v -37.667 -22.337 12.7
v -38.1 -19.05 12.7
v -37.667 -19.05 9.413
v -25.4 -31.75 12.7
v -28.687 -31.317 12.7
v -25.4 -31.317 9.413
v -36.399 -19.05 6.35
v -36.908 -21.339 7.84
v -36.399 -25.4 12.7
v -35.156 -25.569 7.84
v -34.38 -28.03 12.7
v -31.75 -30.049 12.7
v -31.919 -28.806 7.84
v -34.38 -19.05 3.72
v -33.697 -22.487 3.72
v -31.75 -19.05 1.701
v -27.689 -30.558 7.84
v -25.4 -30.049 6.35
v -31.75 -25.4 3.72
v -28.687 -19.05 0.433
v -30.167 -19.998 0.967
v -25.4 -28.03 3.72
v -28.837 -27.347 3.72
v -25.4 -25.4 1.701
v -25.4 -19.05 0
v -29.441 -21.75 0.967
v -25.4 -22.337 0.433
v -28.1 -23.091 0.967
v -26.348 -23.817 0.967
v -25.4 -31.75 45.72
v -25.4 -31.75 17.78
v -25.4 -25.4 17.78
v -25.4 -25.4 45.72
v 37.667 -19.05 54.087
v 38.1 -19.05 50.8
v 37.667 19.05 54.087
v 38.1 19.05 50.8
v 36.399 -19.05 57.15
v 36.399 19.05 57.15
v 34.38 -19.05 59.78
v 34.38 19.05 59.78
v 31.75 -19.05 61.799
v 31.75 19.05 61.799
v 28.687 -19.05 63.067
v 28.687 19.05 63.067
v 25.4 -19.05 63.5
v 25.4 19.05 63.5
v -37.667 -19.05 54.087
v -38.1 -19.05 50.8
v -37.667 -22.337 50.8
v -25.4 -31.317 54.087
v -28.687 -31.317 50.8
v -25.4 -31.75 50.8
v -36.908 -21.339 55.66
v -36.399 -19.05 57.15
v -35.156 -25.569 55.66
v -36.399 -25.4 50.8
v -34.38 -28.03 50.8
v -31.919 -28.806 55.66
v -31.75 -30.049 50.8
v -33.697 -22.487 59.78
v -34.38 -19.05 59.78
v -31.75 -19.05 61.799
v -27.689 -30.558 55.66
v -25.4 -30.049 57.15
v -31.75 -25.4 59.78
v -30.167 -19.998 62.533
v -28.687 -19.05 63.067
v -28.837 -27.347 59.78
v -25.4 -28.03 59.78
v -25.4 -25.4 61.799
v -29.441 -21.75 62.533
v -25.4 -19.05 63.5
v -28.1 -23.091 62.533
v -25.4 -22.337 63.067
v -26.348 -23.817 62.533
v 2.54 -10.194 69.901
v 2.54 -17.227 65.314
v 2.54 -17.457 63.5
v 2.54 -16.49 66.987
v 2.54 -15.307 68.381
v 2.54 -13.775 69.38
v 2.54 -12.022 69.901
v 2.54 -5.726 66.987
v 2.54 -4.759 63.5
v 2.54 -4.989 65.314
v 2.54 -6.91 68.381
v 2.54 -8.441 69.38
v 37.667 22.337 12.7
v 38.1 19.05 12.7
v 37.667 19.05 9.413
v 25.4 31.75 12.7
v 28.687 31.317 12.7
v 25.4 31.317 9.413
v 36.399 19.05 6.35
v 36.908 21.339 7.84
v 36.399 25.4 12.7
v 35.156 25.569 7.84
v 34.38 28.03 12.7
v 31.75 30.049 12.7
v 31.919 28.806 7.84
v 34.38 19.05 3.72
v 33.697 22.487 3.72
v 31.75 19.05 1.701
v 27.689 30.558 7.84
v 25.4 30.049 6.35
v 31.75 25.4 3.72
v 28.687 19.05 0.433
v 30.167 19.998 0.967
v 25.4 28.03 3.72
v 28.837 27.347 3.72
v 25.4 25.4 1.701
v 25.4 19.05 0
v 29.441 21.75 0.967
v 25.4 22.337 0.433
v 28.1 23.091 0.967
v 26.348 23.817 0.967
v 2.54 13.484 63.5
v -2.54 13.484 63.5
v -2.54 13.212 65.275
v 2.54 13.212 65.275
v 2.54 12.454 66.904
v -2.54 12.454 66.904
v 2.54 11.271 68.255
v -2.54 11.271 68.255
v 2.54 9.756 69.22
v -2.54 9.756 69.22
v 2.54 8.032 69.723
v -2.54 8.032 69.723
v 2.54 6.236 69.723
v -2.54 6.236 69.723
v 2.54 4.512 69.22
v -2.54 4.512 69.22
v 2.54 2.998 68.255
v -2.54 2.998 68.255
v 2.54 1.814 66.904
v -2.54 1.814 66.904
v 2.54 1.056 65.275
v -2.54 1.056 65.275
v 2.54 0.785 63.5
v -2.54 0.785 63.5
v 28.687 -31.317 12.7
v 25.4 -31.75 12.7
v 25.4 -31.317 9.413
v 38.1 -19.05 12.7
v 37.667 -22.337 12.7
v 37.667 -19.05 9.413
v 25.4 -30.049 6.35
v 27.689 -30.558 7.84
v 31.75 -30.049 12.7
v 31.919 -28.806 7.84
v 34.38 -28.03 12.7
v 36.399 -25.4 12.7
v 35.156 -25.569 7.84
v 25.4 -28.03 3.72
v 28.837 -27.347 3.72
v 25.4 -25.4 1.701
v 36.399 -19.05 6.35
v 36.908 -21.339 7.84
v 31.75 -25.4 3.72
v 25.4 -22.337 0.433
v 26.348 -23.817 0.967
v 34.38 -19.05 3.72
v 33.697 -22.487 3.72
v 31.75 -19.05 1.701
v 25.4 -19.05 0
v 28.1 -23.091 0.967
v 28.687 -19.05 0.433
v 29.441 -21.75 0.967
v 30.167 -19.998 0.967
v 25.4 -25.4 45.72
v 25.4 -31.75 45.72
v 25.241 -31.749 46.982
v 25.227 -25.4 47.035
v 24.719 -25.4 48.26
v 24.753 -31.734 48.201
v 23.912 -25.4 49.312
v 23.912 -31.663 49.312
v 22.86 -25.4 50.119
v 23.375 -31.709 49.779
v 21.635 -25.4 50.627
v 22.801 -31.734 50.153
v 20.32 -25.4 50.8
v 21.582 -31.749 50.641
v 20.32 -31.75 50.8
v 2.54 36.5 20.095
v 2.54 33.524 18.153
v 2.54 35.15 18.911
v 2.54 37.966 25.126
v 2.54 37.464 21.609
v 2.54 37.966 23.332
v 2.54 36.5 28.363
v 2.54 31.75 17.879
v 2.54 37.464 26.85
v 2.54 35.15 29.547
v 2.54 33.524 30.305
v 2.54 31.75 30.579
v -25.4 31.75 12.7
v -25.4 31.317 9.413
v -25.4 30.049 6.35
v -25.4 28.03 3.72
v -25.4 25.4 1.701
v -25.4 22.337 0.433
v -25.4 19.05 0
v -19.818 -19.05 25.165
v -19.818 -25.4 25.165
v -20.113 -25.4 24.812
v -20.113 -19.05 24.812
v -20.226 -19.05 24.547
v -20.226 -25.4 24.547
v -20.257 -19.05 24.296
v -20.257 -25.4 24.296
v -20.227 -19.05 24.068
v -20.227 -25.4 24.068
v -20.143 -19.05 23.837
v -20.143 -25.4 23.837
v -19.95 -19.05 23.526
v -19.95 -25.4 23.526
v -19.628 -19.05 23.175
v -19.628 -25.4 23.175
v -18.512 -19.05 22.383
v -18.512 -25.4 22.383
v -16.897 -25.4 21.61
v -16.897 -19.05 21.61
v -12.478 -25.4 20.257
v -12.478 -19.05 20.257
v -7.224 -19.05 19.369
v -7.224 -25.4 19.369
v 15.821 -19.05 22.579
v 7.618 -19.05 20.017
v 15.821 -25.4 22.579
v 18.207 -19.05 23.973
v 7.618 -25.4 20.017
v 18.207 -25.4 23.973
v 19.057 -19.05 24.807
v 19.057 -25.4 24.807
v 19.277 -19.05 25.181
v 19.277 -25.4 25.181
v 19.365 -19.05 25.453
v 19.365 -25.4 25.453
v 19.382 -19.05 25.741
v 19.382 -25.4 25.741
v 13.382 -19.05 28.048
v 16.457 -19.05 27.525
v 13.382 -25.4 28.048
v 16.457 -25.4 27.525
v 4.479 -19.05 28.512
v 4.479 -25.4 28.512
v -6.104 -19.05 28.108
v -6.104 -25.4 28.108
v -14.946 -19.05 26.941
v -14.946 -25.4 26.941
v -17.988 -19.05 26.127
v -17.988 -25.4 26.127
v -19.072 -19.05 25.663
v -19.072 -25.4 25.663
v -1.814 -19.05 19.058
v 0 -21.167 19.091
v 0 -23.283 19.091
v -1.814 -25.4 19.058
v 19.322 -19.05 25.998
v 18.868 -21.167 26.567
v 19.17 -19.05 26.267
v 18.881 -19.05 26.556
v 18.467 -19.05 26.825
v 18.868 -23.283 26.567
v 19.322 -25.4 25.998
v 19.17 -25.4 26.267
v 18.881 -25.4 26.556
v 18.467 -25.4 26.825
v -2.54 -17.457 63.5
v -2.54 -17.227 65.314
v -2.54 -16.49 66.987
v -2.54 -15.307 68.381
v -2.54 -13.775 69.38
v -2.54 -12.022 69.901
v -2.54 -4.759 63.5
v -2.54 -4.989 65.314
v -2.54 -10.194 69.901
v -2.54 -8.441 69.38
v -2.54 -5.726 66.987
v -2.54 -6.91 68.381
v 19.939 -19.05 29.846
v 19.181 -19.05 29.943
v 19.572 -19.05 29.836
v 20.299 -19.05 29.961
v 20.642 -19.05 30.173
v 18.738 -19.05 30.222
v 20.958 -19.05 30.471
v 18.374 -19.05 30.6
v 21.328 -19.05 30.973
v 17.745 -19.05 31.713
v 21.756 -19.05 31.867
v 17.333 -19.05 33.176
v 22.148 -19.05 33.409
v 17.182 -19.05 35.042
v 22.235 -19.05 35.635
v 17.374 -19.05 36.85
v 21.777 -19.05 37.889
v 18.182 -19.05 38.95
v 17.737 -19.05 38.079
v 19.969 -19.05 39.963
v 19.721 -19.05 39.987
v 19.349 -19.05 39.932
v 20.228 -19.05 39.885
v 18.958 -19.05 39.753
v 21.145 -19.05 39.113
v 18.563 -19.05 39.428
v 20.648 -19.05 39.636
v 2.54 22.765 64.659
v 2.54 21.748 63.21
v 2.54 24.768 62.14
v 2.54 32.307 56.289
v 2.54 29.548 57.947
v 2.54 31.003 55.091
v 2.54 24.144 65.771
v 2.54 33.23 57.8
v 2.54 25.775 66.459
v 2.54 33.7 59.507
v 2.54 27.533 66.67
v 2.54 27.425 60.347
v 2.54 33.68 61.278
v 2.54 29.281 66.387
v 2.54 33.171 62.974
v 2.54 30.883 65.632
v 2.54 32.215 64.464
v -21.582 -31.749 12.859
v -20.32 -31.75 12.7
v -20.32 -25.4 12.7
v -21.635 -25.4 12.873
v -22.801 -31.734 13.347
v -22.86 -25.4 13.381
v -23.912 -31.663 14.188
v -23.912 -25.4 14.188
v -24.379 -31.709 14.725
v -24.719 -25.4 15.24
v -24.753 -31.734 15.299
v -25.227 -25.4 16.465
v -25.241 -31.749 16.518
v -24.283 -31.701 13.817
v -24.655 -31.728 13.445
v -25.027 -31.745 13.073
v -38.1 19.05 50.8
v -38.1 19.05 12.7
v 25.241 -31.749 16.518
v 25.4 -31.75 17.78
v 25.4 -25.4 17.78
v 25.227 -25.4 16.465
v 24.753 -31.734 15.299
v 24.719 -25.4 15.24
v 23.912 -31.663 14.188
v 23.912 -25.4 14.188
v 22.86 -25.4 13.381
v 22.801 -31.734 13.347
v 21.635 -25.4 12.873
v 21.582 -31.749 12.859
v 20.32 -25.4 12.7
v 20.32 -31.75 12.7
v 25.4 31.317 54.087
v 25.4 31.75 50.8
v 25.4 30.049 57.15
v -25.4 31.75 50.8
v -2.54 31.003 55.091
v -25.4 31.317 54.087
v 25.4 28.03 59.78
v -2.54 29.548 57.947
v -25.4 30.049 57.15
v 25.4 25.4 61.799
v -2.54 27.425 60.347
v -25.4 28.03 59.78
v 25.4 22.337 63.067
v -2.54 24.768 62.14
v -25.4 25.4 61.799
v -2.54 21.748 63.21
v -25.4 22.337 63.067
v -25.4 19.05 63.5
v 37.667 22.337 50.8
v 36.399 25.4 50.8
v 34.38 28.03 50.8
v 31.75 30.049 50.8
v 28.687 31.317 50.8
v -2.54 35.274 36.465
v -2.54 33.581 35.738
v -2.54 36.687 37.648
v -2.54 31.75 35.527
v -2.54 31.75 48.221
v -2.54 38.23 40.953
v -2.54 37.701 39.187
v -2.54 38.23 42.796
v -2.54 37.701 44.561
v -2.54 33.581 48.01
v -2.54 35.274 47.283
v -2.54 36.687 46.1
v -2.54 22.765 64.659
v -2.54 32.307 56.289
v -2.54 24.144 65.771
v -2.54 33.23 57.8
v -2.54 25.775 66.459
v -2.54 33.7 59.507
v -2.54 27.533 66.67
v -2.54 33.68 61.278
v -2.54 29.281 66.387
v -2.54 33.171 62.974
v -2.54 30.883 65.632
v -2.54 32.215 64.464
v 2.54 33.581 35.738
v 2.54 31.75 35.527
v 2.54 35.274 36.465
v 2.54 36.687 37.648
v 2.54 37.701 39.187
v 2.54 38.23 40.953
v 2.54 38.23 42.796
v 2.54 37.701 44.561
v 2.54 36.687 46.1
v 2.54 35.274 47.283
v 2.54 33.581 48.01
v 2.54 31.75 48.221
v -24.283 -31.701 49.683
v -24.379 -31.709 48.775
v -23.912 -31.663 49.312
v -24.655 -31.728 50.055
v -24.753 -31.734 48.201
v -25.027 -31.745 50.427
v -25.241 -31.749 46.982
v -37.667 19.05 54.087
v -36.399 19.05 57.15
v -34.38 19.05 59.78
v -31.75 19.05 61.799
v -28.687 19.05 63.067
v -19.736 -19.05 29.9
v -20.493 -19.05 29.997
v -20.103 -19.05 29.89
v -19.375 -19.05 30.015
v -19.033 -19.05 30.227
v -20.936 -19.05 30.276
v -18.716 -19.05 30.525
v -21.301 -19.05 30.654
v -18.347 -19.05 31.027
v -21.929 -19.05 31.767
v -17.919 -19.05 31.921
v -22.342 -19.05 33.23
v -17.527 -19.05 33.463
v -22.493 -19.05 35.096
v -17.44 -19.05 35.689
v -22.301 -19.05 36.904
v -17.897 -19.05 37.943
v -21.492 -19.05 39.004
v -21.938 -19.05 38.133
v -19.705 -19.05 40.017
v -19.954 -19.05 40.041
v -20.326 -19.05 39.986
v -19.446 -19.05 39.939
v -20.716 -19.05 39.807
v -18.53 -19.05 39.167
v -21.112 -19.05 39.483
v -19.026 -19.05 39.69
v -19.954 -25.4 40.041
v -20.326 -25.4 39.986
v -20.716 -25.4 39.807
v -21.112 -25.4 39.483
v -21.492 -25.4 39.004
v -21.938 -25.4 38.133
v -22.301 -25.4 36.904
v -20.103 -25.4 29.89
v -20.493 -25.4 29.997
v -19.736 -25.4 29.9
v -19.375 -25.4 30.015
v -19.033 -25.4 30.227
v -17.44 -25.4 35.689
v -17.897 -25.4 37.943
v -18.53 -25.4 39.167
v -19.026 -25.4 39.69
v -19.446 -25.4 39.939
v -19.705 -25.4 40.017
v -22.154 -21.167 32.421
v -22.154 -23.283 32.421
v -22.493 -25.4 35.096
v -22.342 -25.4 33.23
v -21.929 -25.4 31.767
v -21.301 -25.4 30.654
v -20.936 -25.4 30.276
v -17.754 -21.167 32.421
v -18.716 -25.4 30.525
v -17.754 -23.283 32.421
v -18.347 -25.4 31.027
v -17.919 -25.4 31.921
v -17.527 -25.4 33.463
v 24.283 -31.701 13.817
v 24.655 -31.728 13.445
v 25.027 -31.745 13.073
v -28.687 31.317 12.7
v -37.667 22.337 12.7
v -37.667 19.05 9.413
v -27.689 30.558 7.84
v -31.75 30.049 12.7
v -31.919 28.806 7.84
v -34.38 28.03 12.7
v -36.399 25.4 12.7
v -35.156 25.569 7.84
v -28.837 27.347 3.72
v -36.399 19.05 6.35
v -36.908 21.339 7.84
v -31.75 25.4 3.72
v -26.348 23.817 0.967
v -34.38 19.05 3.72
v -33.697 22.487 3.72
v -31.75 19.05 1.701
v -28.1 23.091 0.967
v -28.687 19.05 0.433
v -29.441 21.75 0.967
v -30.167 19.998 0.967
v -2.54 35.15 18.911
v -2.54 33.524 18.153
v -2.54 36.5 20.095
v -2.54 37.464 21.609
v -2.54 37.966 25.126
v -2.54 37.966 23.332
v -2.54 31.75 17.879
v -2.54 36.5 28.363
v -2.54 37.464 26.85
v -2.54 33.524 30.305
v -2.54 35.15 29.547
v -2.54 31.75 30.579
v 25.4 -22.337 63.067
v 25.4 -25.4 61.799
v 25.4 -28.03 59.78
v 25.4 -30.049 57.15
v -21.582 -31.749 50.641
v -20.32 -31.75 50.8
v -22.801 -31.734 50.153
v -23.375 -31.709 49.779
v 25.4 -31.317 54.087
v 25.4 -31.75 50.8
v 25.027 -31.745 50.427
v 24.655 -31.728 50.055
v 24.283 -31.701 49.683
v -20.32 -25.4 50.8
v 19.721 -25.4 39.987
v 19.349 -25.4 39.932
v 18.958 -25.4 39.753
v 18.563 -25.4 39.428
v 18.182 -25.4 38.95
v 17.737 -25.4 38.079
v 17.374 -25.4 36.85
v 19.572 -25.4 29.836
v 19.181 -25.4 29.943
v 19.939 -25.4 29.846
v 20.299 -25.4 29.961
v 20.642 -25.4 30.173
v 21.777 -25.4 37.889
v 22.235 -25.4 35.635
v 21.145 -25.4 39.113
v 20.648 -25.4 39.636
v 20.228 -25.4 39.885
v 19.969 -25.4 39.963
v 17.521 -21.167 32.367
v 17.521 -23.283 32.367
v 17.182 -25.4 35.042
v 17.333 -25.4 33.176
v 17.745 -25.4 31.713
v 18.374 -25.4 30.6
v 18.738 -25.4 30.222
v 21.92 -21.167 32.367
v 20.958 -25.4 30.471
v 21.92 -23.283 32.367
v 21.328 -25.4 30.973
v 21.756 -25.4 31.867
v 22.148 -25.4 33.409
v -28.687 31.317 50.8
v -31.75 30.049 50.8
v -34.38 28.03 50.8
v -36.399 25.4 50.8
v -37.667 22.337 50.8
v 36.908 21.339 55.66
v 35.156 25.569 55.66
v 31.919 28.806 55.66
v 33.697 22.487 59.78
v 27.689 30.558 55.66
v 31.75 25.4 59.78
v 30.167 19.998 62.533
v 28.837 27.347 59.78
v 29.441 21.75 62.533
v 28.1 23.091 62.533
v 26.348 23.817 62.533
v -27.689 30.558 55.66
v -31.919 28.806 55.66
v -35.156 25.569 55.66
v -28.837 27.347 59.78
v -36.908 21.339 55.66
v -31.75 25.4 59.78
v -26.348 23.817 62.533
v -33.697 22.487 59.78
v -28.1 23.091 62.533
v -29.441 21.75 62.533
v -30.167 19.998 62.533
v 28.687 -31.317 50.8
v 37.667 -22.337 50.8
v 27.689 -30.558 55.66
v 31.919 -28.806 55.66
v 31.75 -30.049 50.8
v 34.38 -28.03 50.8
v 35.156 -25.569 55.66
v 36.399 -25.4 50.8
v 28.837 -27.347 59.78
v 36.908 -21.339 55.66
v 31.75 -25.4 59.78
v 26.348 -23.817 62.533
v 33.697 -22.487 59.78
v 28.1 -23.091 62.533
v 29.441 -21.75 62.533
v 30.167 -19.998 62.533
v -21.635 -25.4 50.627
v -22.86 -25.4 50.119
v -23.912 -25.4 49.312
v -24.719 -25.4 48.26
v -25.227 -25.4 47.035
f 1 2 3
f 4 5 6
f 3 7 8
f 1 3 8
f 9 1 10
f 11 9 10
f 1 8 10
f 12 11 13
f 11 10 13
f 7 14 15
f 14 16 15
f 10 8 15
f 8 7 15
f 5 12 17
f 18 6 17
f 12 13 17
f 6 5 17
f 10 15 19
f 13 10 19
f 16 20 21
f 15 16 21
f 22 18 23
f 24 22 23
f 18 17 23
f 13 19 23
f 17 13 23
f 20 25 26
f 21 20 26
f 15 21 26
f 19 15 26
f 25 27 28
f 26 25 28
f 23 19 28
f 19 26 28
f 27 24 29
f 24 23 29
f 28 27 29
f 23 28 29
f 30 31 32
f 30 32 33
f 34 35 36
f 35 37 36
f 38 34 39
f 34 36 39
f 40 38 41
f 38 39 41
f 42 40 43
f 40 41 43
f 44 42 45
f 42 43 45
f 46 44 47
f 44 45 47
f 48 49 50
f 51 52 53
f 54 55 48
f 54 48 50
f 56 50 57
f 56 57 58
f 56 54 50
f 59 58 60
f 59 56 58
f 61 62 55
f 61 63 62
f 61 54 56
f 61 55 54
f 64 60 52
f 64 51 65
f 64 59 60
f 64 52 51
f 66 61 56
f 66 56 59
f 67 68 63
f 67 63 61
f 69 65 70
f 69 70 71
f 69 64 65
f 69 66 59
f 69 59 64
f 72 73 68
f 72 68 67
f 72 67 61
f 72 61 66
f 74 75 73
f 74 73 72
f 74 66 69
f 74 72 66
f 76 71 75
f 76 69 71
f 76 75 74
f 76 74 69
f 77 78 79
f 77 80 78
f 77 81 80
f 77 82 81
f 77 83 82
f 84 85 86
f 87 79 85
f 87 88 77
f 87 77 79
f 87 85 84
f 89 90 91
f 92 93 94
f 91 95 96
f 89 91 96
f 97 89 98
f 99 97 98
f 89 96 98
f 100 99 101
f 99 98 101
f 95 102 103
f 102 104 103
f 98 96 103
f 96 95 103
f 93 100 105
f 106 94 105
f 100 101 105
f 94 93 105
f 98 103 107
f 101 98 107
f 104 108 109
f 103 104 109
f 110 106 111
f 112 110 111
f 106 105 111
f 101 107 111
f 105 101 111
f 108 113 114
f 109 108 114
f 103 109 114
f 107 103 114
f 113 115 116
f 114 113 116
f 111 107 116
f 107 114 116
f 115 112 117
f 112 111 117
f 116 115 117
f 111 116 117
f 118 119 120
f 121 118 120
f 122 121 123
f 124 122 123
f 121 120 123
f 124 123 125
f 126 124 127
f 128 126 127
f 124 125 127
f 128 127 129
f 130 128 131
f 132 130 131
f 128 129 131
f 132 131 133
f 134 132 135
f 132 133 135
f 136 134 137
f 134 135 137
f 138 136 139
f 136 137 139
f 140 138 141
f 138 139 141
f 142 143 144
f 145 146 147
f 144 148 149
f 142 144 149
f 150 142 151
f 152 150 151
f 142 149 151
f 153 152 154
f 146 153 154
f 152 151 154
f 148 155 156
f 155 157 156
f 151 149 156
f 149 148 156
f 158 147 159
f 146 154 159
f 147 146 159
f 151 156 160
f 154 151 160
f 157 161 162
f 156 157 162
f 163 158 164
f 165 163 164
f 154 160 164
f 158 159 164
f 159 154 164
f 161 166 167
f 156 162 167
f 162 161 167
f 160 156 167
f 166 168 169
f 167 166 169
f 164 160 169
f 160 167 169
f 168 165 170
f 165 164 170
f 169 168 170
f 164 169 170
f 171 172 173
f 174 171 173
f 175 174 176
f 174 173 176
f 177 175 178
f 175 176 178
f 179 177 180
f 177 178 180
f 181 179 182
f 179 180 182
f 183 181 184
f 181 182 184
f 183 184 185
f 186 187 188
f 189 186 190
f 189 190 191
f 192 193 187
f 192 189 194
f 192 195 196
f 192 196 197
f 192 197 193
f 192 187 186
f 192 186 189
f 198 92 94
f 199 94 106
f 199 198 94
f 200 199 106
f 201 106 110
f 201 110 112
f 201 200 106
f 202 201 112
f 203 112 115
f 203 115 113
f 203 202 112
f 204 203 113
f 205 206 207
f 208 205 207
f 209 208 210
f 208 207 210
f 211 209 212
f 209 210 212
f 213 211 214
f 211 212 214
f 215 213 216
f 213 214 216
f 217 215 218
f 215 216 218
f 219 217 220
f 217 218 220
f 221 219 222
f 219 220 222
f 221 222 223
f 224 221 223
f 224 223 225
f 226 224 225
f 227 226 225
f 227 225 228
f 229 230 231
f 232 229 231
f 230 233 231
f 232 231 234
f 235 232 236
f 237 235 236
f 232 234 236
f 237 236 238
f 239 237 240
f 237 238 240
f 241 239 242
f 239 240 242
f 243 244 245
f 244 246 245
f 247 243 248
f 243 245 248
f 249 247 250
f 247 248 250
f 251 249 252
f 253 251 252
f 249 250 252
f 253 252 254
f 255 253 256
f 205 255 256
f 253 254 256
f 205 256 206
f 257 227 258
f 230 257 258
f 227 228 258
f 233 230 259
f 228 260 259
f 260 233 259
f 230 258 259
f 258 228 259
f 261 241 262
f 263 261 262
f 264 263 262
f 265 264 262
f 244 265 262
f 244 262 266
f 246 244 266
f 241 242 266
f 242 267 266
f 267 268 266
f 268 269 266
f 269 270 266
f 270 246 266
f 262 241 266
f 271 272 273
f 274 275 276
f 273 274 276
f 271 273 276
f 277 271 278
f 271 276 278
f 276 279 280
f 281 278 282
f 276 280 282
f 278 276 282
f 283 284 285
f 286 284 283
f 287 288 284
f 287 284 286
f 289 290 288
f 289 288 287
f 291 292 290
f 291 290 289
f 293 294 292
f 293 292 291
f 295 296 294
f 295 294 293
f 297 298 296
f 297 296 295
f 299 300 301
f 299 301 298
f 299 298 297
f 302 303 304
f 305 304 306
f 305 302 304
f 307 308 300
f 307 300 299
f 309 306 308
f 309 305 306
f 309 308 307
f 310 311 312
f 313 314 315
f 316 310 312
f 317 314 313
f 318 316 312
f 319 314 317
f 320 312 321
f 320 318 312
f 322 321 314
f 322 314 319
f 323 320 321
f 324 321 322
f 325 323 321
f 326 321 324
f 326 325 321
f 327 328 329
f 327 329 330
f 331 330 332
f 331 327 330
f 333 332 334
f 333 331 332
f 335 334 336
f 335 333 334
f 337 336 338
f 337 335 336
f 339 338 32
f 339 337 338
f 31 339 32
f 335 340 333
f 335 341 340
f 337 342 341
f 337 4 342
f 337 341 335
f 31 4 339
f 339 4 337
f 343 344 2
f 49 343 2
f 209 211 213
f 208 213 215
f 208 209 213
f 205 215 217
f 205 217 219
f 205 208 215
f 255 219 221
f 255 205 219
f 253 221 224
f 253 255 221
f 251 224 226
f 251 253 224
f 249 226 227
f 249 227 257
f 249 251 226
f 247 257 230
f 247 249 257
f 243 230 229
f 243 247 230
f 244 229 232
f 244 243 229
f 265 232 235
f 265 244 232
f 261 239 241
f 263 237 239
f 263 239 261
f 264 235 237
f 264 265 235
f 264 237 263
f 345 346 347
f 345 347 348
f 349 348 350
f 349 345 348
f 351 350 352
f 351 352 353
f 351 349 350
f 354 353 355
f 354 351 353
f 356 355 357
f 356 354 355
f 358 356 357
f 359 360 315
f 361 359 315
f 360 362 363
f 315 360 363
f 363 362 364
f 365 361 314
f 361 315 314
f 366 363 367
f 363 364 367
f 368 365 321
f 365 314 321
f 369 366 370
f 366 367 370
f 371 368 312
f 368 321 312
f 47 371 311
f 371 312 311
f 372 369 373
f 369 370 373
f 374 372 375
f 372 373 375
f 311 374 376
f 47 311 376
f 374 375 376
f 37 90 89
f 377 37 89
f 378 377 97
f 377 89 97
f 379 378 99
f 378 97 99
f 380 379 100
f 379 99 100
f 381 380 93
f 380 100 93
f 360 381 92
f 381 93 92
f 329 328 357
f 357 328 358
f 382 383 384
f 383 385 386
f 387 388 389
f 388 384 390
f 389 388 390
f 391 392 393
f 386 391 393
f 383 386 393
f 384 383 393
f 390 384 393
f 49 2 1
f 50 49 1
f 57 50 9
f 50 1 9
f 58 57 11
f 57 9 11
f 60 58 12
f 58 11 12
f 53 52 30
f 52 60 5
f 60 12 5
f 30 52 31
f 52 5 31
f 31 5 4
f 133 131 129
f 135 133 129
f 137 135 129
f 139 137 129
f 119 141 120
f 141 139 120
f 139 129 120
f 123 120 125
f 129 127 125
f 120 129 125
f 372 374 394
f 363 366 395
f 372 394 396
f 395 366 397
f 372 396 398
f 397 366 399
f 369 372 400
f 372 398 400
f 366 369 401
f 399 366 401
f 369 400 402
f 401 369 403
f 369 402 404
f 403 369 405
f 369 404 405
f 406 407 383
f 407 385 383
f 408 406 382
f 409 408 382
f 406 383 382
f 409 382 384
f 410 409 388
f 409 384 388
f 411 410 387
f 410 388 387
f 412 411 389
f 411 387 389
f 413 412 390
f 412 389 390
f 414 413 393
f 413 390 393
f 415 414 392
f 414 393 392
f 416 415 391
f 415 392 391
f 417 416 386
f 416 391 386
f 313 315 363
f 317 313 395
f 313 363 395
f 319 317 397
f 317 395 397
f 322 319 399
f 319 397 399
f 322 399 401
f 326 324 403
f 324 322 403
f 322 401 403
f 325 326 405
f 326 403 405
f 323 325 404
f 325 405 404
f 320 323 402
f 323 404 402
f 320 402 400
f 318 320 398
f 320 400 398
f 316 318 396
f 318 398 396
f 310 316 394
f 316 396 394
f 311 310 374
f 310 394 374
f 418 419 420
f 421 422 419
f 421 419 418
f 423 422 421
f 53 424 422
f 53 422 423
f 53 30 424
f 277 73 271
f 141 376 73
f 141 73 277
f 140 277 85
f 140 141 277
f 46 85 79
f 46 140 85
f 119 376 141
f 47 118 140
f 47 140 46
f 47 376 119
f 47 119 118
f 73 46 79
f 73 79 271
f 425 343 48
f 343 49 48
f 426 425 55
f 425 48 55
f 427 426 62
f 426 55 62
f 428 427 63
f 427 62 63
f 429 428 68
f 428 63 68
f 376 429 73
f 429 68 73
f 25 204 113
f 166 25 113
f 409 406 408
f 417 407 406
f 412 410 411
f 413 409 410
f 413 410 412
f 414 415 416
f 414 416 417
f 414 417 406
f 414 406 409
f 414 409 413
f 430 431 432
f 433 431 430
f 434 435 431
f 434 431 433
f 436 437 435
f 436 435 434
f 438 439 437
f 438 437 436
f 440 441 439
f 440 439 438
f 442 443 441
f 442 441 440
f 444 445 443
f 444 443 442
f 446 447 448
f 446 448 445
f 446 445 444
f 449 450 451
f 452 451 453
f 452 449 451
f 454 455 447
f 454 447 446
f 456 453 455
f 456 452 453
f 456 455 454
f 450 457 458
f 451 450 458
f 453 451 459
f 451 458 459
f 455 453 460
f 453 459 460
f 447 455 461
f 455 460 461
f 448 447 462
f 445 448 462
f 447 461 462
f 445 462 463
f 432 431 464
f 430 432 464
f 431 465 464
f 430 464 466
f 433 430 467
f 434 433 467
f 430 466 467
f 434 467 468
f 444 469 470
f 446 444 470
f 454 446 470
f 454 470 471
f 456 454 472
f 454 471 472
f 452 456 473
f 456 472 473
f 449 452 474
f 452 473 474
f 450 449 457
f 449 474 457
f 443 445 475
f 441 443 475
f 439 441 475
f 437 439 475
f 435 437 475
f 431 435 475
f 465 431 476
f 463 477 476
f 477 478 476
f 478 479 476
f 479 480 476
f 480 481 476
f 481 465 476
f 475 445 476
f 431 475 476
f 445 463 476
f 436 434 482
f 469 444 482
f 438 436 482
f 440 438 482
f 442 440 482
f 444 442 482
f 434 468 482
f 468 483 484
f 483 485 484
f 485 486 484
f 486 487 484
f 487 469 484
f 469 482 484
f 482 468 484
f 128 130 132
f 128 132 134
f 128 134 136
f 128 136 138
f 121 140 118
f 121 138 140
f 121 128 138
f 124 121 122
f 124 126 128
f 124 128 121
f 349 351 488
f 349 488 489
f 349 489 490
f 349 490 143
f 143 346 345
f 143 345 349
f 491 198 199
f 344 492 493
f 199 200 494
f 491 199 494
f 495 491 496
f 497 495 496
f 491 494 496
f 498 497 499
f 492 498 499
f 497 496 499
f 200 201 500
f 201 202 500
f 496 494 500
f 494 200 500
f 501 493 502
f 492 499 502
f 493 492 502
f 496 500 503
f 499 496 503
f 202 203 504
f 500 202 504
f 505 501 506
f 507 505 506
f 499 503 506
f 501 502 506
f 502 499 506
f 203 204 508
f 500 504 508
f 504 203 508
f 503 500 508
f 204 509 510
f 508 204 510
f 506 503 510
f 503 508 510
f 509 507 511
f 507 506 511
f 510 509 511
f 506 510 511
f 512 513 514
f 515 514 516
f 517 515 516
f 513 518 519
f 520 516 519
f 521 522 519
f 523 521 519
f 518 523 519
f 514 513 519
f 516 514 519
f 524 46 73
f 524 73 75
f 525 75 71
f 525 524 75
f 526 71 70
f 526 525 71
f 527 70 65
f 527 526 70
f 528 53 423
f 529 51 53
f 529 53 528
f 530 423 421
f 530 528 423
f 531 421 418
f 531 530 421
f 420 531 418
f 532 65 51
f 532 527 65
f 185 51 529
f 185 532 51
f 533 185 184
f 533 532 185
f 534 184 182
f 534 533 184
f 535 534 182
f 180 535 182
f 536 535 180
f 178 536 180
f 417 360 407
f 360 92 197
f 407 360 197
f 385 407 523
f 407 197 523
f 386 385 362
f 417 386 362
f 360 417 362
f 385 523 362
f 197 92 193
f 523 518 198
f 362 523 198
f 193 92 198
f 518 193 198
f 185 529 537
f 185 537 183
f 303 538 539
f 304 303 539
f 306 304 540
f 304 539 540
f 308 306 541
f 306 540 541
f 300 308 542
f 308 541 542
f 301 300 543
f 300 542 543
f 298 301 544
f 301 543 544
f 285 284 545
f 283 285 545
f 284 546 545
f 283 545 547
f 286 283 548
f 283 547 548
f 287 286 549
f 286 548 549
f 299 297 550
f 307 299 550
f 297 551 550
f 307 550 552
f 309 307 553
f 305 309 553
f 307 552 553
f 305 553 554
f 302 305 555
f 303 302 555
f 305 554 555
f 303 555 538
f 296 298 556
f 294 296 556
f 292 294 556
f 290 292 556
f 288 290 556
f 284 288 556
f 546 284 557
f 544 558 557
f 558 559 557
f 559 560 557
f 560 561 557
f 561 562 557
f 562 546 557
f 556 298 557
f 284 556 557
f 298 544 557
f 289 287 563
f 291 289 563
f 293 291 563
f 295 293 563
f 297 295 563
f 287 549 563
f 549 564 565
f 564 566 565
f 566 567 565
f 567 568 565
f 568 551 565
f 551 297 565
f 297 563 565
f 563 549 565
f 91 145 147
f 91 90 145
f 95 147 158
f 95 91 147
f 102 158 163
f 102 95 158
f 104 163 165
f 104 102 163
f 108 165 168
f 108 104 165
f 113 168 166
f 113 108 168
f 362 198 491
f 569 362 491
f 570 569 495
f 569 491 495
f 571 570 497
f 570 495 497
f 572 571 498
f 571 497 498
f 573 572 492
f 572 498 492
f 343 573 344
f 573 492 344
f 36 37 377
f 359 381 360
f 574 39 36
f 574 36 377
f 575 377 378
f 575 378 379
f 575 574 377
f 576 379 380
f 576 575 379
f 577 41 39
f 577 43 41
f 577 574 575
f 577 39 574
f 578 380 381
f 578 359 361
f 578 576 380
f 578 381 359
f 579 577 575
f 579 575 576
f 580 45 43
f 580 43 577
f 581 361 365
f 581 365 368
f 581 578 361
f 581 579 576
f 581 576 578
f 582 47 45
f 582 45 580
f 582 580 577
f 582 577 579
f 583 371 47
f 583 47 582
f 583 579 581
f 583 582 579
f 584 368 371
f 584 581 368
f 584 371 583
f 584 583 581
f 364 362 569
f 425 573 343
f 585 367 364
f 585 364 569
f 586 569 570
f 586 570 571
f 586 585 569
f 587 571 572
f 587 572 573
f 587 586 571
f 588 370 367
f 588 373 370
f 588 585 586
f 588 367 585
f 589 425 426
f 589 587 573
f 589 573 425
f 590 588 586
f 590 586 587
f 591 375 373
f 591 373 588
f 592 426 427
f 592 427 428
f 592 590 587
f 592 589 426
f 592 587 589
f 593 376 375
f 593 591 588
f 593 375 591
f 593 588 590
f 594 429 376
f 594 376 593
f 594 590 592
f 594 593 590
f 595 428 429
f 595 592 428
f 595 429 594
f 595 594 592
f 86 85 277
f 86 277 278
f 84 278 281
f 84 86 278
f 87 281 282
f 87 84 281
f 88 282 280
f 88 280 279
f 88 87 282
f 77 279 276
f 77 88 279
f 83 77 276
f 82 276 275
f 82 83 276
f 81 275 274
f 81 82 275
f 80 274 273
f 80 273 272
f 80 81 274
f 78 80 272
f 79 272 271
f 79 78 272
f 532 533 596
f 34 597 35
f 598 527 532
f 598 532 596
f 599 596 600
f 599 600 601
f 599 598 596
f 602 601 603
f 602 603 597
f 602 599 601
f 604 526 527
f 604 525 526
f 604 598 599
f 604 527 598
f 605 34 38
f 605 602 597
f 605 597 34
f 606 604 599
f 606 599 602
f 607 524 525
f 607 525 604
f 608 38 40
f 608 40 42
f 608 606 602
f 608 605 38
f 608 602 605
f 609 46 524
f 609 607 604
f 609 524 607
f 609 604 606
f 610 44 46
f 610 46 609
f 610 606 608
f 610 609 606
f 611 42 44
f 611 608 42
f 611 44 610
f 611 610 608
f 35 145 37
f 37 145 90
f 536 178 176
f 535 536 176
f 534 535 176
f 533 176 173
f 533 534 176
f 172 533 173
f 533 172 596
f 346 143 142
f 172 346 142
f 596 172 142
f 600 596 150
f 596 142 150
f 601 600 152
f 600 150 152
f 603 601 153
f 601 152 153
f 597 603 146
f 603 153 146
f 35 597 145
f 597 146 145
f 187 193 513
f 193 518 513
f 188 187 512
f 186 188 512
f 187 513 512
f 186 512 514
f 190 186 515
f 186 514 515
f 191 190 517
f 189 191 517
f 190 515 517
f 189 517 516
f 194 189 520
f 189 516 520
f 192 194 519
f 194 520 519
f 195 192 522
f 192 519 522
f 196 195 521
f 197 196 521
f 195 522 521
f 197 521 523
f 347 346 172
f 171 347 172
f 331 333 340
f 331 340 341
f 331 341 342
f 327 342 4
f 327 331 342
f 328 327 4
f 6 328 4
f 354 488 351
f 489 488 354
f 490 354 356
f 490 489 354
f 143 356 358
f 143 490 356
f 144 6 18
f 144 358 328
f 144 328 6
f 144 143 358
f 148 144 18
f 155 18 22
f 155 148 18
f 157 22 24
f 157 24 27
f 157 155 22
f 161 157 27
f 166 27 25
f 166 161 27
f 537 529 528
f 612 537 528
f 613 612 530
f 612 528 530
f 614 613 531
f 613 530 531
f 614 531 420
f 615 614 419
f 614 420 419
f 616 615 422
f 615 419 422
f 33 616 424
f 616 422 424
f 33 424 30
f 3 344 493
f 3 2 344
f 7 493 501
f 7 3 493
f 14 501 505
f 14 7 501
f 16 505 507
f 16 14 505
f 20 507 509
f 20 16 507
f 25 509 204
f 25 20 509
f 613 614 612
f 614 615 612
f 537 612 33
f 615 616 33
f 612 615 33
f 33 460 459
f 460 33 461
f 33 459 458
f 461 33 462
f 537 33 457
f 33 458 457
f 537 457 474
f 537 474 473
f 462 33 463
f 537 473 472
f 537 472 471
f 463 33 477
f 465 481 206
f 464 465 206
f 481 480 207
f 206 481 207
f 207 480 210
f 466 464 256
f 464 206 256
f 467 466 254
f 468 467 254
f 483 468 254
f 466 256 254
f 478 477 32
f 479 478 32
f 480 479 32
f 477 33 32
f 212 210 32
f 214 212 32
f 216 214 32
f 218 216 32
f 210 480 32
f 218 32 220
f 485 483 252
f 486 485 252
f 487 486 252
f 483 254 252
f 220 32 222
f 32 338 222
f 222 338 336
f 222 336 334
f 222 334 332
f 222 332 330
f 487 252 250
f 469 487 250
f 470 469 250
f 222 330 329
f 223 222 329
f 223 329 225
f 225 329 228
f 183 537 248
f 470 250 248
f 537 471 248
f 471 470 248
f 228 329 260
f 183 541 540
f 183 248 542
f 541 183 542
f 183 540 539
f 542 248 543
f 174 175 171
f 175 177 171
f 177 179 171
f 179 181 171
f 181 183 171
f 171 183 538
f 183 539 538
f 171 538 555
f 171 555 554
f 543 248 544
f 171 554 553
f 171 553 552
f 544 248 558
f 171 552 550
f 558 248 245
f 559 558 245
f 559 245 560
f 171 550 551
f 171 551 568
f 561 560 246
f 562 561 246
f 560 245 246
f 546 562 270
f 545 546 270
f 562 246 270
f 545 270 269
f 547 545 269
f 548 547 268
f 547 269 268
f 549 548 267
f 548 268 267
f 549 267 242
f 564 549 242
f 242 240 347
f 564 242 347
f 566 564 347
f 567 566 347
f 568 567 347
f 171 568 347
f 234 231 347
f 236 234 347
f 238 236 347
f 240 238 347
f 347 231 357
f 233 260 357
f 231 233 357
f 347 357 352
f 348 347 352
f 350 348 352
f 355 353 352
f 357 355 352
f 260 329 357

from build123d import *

# Parameters (mm, degrees)
F1_DEPTH       = 63.5
F2_R           = 12.7
F3_DEPTH       = 6.35
F4_T4_DEPTH    = 19.05
F4_S5_R        = 12.7
F4_T6_DEPTH    = 12
F4_S7_R        = 12.7
F4_T8_DEPTH    = 12
F4_T12_DEPTH   = 19.05
F4_S13_R       = 12.7
F4_T14_DEPTH   = 12
F4_S15_R       = 12.7
F4_T16_DEPTH   = 12
F4_T20_DEPTH   = 19.05
F4_S21_R       = 12.7
F4_T22_DEPTH   = 12
F4_S23_R       = 12.7
F4_T24_DEPTH   = 12
F4_T28_DEPTH   = 31.75
F4_T33_DEPTH   = 19.05
F4_S34_R       = 12.7
F4_T35_DEPTH   = 12
F4_S36_R       = 12.7
F4_T37_DEPTH   = 12
F4_T41_DEPTH   = 19.05
F4_S42_R       = 12.7
F4_T43_DEPTH   = 12
F4_S44_R       = 12.7
F4_T45_DEPTH   = 12
F4_T49_DEPTH   = 19.05
F4_S50_R       = 12.7
F4_T51_DEPTH   = 12
F4_S52_R       = 12.7
F4_T53_DEPTH   = 12
F4_T57_DEPTH   = 31.75
F4_T62_DEPTH   = 19.05
F4_S63_R       = 12.7
F4_T64_DEPTH   = 12
F4_S65_R       = 12.7
F4_T66_DEPTH   = 12
F4_T70_DEPTH   = 19.05
F4_S71_R       = 12.7
F4_T72_DEPTH   = 12
F4_S73_R       = 12.7
F4_T74_DEPTH   = 12
F4_T78_DEPTH   = 19.05
F4_S79_R       = 12.7
F4_T80_DEPTH   = 12
F4_S81_R       = 12.7
F4_T82_DEPTH   = 12
F4_T86_DEPTH   = 31.75
F4_T91_DEPTH   = 19.05
F4_S92_R       = 12.7
F4_T93_DEPTH   = 12
F4_S94_R       = 12.7
F4_T95_DEPTH   = 12
F4_T99_DEPTH   = 19.05
F4_S100_R      = 12.7
F4_T101_DEPTH  = 12
F4_S102_R      = 12.7
F4_T103_DEPTH  = 12
F4_T107_DEPTH  = 19.05
F4_S108_R      = 12.7
F4_T109_DEPTH  = 12
F4_S110_R      = 12.7
F4_T111_DEPTH  = 12
F4_T115_DEPTH  = 31.75
F7_DEPTH       = 6.35
F9_DEPTH       = 6.35
F10_R          = 6.35
F11_DEPTH      = 2.54
F11_DEPTH_BACK = 2.54


# Not quite as in the source:
# - a fillet or chamfer that OpenCascade refuses, or shapes differently, is made with other operations: its cross-section is extruded or revolved along the edge and cut away or added


with BuildPart() as f1:
    # F0 (on Top) → F1 (new body)
    with BuildSketch(Plane.XY):
        with BuildLine():
            ThreePointArc((38.1, 19.05), (34.3802561211, 28.0302561211), (25.4, 31.75))
            Line((25.4, 31.75), (-25.4, 31.75))
            ThreePointArc((-25.4, 31.75), (-34.3802561211, 28.0302561211), (-38.1, 19.05))
            Line((-38.1, 19.05), (-38.1, -19.05))
            ThreePointArc((-38.1, -19.05), (-34.3802561211, -28.0302561211), (-25.4, -31.75))
            Line((-25.4, -31.75), (25.4, -31.75))
            ThreePointArc((25.4, -31.75), (34.3802561211, -28.0302561211), (38.1, -19.05))
            Line((38.1, -19.05), (38.1, 19.05))
        make_face()
    extrude(amount=F1_DEPTH)

    # F2
    f2_edges = [f1.edges().sort_by_distance(p)[0] for p in [
        (34.380256, 28.030256, 63.5),
        (0, 31.75, 63.5),
        (-34.380256, 28.030256, 63.5),
        (-38.1, 0, 63.5),
        (-34.380256, -28.030256, 63.5),
        (0, -31.75, 63.5),
        (34.380256, -28.030256, 63.5),
        (38.1, 0, 63.5),
        (34.380256, 28.030256, 0),
        (0, 31.75, 0),
        (-34.380256, 28.030256, 0),
        (-38.1, 0, 0),
        (-34.380256, -28.030256, 0),
        (0, -31.75, 0),
        (34.380256, -28.030256, 0),
        (38.1, 0, 0),
    ]]
    fillet(f2_edges, radius=F2_R)

    # F3 (cut): a face of the model
    f3_faces = [f1.faces().sort_by_distance(p)[0] for p in [
        (0, -31.75, 31.75),
    ]]
    extrude(f3_faces, amount=-F3_DEPTH, mode=Mode.SUBTRACT)

    # F4: fillet of radius 5.08 on 4 edges, made by hand


with BuildPart() as f4_tool2:
    # F4_s3 → F4_t4 (new body)
    with BuildSketch(Plane.XZ.offset(44.45)):
        with BuildLine():
            ThreePointArc((25.4, 17.78), (23.9121024484, 14.1878975516), (20.32, 12.7))
            Line((20.32, 12.7), (25.4, 12.7))
            Line((25.4, 12.7), (25.4, 17.78))
        make_face()
    extrude(amount=-F4_T4_DEPTH)

    # F4_s5 → F4_t6 (cut, symmetric)
    with BuildSketch(Plane.XY.offset(15.2)):
        with Locations((25.4, -19.05)):
            Circle(F4_S5_R)
    extrude(amount=F4_T6_DEPTH, both=True, mode=Mode.SUBTRACT)

    # F4_s7 → F4_t8 (intersect, symmetric)
    with BuildSketch(Plane.YZ.offset(22.9)):
        with Locations((-19.05, 12.7)):
            Circle(F4_S7_R)
    extrude(amount=F4_T8_DEPTH, both=True, mode=Mode.INTERSECT)


with BuildPart() as f1_1:
    add(f1.part)

    # F4_t1: union F4_tool2
    add(f4_tool2.part)


with BuildPart() as f4_tool10:
    # F4_s11 → F4_t12 (new body)
    with BuildSketch(Plane.XZ.offset(44.45)):
        with BuildLine():
            ThreePointArc((25.4, 17.78), (23.9121024484, 14.1878975516), (20.32, 12.7))
            Line((20.32, 12.7), (25.4, 12.7))
            Line((25.4, 12.7), (25.4, 17.78))
        make_face()
    extrude(amount=-F4_T12_DEPTH)

    # F4_s13 → F4_t14 (intersect, symmetric)
    with BuildSketch(Plane.XY.offset(15.2)):
        with Locations((25.4, -19.05)):
            Circle(F4_S13_R)
    extrude(amount=F4_T14_DEPTH, both=True, mode=Mode.INTERSECT)

    # F4_s15 → F4_t16 (cut, symmetric)
    with BuildSketch(Plane.YZ.offset(22.9)):
        with Locations((-19.05, 12.7)):
            Circle(F4_S15_R)
    extrude(amount=F4_T16_DEPTH, both=True, mode=Mode.SUBTRACT)


with BuildPart() as f1_2:
    add(f1_1.part)

    # F4_t9: union F4_tool10
    add(f4_tool10.part)


with BuildPart() as f4_tool18:
    # F4_s19 → F4_t20 (new body)
    with BuildSketch(Plane.XZ.offset(44.45)):
        with BuildLine():
            ThreePointArc((25.4, 17.78), (23.9121024484, 14.1878975516), (20.32, 12.7))
            Line((20.32, 12.7), (25.4, 12.7))
            Line((25.4, 12.7), (25.4, 17.78))
        make_face()
    extrude(amount=-F4_T20_DEPTH)

    # F4_s21 → F4_t22 (intersect, symmetric)
    with BuildSketch(Plane.XY.offset(15.2)):
        with Locations((25.4, -19.05)):
            Circle(F4_S21_R)
    extrude(amount=F4_T22_DEPTH, both=True, mode=Mode.INTERSECT)

    # F4_s23 → F4_t24 (intersect, symmetric)
    with BuildSketch(Plane.YZ.offset(22.9)):
        with Locations((-19.05, 12.7)):
            Circle(F4_S23_R)
    extrude(amount=F4_T24_DEPTH, both=True, mode=Mode.INTERSECT)


with BuildPart() as f1_3:
    add(f1_2.part)

    # F4_t17: union F4_tool18
    add(f4_tool18.part)


with BuildPart() as f4_tool26:
    # F4_s27 → F4_t28 (new body)
    with BuildSketch(Plane.XZ.offset(44.45)):
        with BuildLine():
            ThreePointArc((25.4, 17.78), (23.9121024484, 14.1878975516), (20.32, 12.7))
            Line((20.32, 12.7), (25.4, 12.7))
            Line((25.4, 12.7), (25.4, 17.78))
        make_face()
    extrude(amount=-F4_T28_DEPTH)

    split(bisect_by=Plane.XZ.offset(25.4), keep=Keep.BOTTOM)


with BuildPart() as f1_4:
    add(f1_3.part)

    # F4_t25: union F4_tool26
    add(f4_tool26.part)


with BuildPart() as f4_tool31:
    # F4_s32 → F4_t33 (new body)
    with BuildSketch(Plane.XZ.offset(44.45)):
        with BuildLine():
            ThreePointArc((25.4, 45.72), (23.9121024484, 49.3121024484), (20.32, 50.8))
            Line((20.32, 50.8), (25.4, 50.8))
            Line((25.4, 50.8), (25.4, 45.72))
        make_face()
    extrude(amount=-F4_T33_DEPTH)

    # F4_s34 → F4_t35 (cut, symmetric)
    with BuildSketch(Plane.XY.offset(48.3)):
        with Locations((25.4, -19.05)):
            Circle(F4_S34_R)
    extrude(amount=F4_T35_DEPTH, both=True, mode=Mode.SUBTRACT)

    # F4_s36 → F4_t37 (intersect, symmetric)
    with BuildSketch(Plane.YZ.offset(22.9)):
        with Locations((-19.05, 50.8)):
            Circle(F4_S36_R)
    extrude(amount=F4_T37_DEPTH, both=True, mode=Mode.INTERSECT)


with BuildPart() as f1_5:
    add(f1_4.part)

    # F4_t30: union F4_tool31
    add(f4_tool31.part)


with BuildPart() as f4_tool39:
    # F4_s40 → F4_t41 (new body)
    with BuildSketch(Plane.XZ.offset(44.45)):
        with BuildLine():
            ThreePointArc((25.4, 45.72), (23.9121024484, 49.3121024484), (20.32, 50.8))
            Line((20.32, 50.8), (25.4, 50.8))
            Line((25.4, 50.8), (25.4, 45.72))
        make_face()
    extrude(amount=-F4_T41_DEPTH)

    # F4_s42 → F4_t43 (intersect, symmetric)
    with BuildSketch(Plane.XY.offset(48.3)):
        with Locations((25.4, -19.05)):
            Circle(F4_S42_R)
    extrude(amount=F4_T43_DEPTH, both=True, mode=Mode.INTERSECT)

    # F4_s44 → F4_t45 (cut, symmetric)
    with BuildSketch(Plane.YZ.offset(22.9)):
        with Locations((-19.05, 50.8)):
            Circle(F4_S44_R)
    extrude(amount=F4_T45_DEPTH, both=True, mode=Mode.SUBTRACT)


with BuildPart() as f1_6:
    add(f1_5.part)

    # F4_t38: union F4_tool39
    add(f4_tool39.part)


with BuildPart() as f4_tool47:
    # F4_s48 → F4_t49 (new body)
    with BuildSketch(Plane.XZ.offset(44.45)):
        with BuildLine():
            ThreePointArc((25.4, 45.72), (23.9121024484, 49.3121024484), (20.32, 50.8))
            Line((20.32, 50.8), (25.4, 50.8))
            Line((25.4, 50.8), (25.4, 45.72))
        make_face()
    extrude(amount=-F4_T49_DEPTH)

    # F4_s50 → F4_t51 (intersect, symmetric)
    with BuildSketch(Plane.XY.offset(48.3)):
        with Locations((25.4, -19.05)):
            Circle(F4_S50_R)
    extrude(amount=F4_T51_DEPTH, both=True, mode=Mode.INTERSECT)

    # F4_s52 → F4_t53 (intersect, symmetric)
    with BuildSketch(Plane.YZ.offset(22.9)):
        with Locations((-19.05, 50.8)):
            Circle(F4_S52_R)
    extrude(amount=F4_T53_DEPTH, both=True, mode=Mode.INTERSECT)


with BuildPart() as f1_7:
    add(f1_6.part)

    # F4_t46: union F4_tool47
    add(f4_tool47.part)


with BuildPart() as f4_tool55:
    # F4_s56 → F4_t57 (new body)
    with BuildSketch(Plane.XZ.offset(44.45)):
        with BuildLine():
            ThreePointArc((25.4, 45.72), (23.9121024484, 49.3121024484), (20.32, 50.8))
            Line((20.32, 50.8), (25.4, 50.8))
            Line((25.4, 50.8), (25.4, 45.72))
        make_face()
    extrude(amount=-F4_T57_DEPTH)

    split(bisect_by=Plane.XZ.offset(25.4), keep=Keep.BOTTOM)


with BuildPart() as f1_8:
    add(f1_7.part)

    # F4_t54: union F4_tool55
    add(f4_tool55.part)


with BuildPart() as f4_tool60:
    # F4_s61 → F4_t62 (new body)
    with BuildSketch(Plane.XZ.offset(44.45)):
        with BuildLine():
            ThreePointArc((-20.32, 12.7), (-23.9121024484, 14.1878975516), (-25.4, 17.78))
            Line((-25.4, 17.78), (-25.4, 12.7))
            Line((-25.4, 12.7), (-20.32, 12.7))
        make_face()
    extrude(amount=-F4_T62_DEPTH)

    # F4_s63 → F4_t64 (cut, symmetric)
    with BuildSketch(Plane.YZ.offset(-22.9)):
        with Locations((-19.05, 12.7)):
            Circle(F4_S63_R)
    extrude(amount=F4_T64_DEPTH, both=True, mode=Mode.SUBTRACT)

    # F4_s65 → F4_t66 (intersect, symmetric)
    with BuildSketch(Plane.XY.offset(15.2)):
        with Locations((-25.4, -19.05)):
            Circle(F4_S65_R)
    extrude(amount=F4_T66_DEPTH, both=True, mode=Mode.INTERSECT)


with BuildPart() as f1_9:
    add(f1_8.part)

    # F4_t59: union F4_tool60
    add(f4_tool60.part)


with BuildPart() as f4_tool68:
    # F4_s69 → F4_t70 (new body)
    with BuildSketch(Plane.XZ.offset(44.45)):
        with BuildLine():
            ThreePointArc((-20.32, 12.7), (-23.9121024484, 14.1878975516), (-25.4, 17.78))
            Line((-25.4, 17.78), (-25.4, 12.7))
            Line((-25.4, 12.7), (-20.32, 12.7))
        make_face()
    extrude(amount=-F4_T70_DEPTH)

    # F4_s71 → F4_t72 (intersect, symmetric)
    with BuildSketch(Plane.YZ.offset(-22.9)):
        with Locations((-19.05, 12.7)):
            Circle(F4_S71_R)
    extrude(amount=F4_T72_DEPTH, both=True, mode=Mode.INTERSECT)

    # F4_s73 → F4_t74 (cut, symmetric)
    with BuildSketch(Plane.XY.offset(15.2)):
        with Locations((-25.4, -19.05)):
            Circle(F4_S73_R)
    extrude(amount=F4_T74_DEPTH, both=True, mode=Mode.SUBTRACT)


with BuildPart() as f1_10:
    add(f1_9.part)

    # F4_t67: union F4_tool68
    add(f4_tool68.part)


with BuildPart() as f4_tool76:
    # F4_s77 → F4_t78 (new body)
    with BuildSketch(Plane.XZ.offset(44.45)):
        with BuildLine():
            ThreePointArc((-20.32, 12.7), (-23.9121024484, 14.1878975516), (-25.4, 17.78))
            Line((-25.4, 17.78), (-25.4, 12.7))
            Line((-25.4, 12.7), (-20.32, 12.7))
        make_face()
    extrude(amount=-F4_T78_DEPTH)

    # F4_s79 → F4_t80 (intersect, symmetric)
    with BuildSketch(Plane.YZ.offset(-22.9)):
        with Locations((-19.05, 12.7)):
            Circle(F4_S79_R)
    extrude(amount=F4_T80_DEPTH, both=True, mode=Mode.INTERSECT)

    # F4_s81 → F4_t82 (intersect, symmetric)
    with BuildSketch(Plane.XY.offset(15.2)):
        with Locations((-25.4, -19.05)):
            Circle(F4_S81_R)
    extrude(amount=F4_T82_DEPTH, both=True, mode=Mode.INTERSECT)


with BuildPart() as f1_11:
    add(f1_10.part)

    # F4_t75: union F4_tool76
    add(f4_tool76.part)


with BuildPart() as f4_tool84:
    # F4_s85 → F4_t86 (new body)
    with BuildSketch(Plane.XZ.offset(44.45)):
        with BuildLine():
            ThreePointArc((-20.32, 12.7), (-23.9121024484, 14.1878975516), (-25.4, 17.78))
            Line((-25.4, 17.78), (-25.4, 12.7))
            Line((-25.4, 12.7), (-20.32, 12.7))
        make_face()
    extrude(amount=-F4_T86_DEPTH)

    split(bisect_by=Plane.XZ.offset(25.4), keep=Keep.BOTTOM)


with BuildPart() as f1_12:
    add(f1_11.part)

    # F4_t83: union F4_tool84
    add(f4_tool84.part)


with BuildPart() as f4_tool89:
    # F4_s90 → F4_t91 (new body)
    with BuildSketch(Plane.XZ.offset(44.45)):
        with BuildLine():
            ThreePointArc((-20.32, 50.8), (-23.9121024484, 49.3121024484), (-25.4, 45.72))
            Line((-25.4, 45.72), (-25.4, 50.8))
            Line((-25.4, 50.8), (-20.32, 50.8))
        make_face()
    extrude(amount=-F4_T91_DEPTH)

    # F4_s92 → F4_t93 (cut, symmetric)
    with BuildSketch(Plane.YZ.offset(-22.9)):
        with Locations((-19.05, 50.8)):
            Circle(F4_S92_R)
    extrude(amount=F4_T93_DEPTH, both=True, mode=Mode.SUBTRACT)

    # F4_s94 → F4_t95 (intersect, symmetric)
    with BuildSketch(Plane.XY.offset(48.3)):
        with Locations((-25.4, -19.05)):
            Circle(F4_S94_R)
    extrude(amount=F4_T95_DEPTH, both=True, mode=Mode.INTERSECT)


with BuildPart() as f1_13:
    add(f1_12.part)

    # F4_t88: union F4_tool89
    add(f4_tool89.part)


with BuildPart() as f4_tool97:
    # F4_s98 → F4_t99 (new body)
    with BuildSketch(Plane.XZ.offset(44.45)):
        with BuildLine():
            ThreePointArc((-20.32, 50.8), (-23.9121024484, 49.3121024484), (-25.4, 45.72))
            Line((-25.4, 45.72), (-25.4, 50.8))
            Line((-25.4, 50.8), (-20.32, 50.8))
        make_face()
    extrude(amount=-F4_T99_DEPTH)

    # F4_s100 → F4_t101 (intersect, symmetric)
    with BuildSketch(Plane.YZ.offset(-22.9)):
        with Locations((-19.05, 50.8)):
            Circle(F4_S100_R)
    extrude(amount=F4_T101_DEPTH, both=True, mode=Mode.INTERSECT)

    # F4_s102 → F4_t103 (cut, symmetric)
    with BuildSketch(Plane.XY.offset(48.3)):
        with Locations((-25.4, -19.05)):
            Circle(F4_S102_R)
    extrude(amount=F4_T103_DEPTH, both=True, mode=Mode.SUBTRACT)


with BuildPart() as f1_14:
    add(f1_13.part)

    # F4_t96: union F4_tool97
    add(f4_tool97.part)


with BuildPart() as f4_tool105:
    # F4_s106 → F4_t107 (new body)
    with BuildSketch(Plane.XZ.offset(44.45)):
        with BuildLine():
            ThreePointArc((-20.32, 50.8), (-23.9121024484, 49.3121024484), (-25.4, 45.72))
            Line((-25.4, 45.72), (-25.4, 50.8))
            Line((-25.4, 50.8), (-20.32, 50.8))
        make_face()
    extrude(amount=-F4_T107_DEPTH)

    # F4_s108 → F4_t109 (intersect, symmetric)
    with BuildSketch(Plane.YZ.offset(-22.9)):
        with Locations((-19.05, 50.8)):
            Circle(F4_S108_R)
    extrude(amount=F4_T109_DEPTH, both=True, mode=Mode.INTERSECT)

    # F4_s110 → F4_t111 (intersect, symmetric)
    with BuildSketch(Plane.XY.offset(48.3)):
        with Locations((-25.4, -19.05)):
            Circle(F4_S110_R)
    extrude(amount=F4_T111_DEPTH, both=True, mode=Mode.INTERSECT)


with BuildPart() as f1_15:
    add(f1_14.part)

    # F4_t104: union F4_tool105
    add(f4_tool105.part)


with BuildPart() as f4_tool113:
    # F4_s114 → F4_t115 (new body)
    with BuildSketch(Plane.XZ.offset(44.45)):
        with BuildLine():
            ThreePointArc((-20.32, 50.8), (-23.9121024484, 49.3121024484), (-25.4, 45.72))
            Line((-25.4, 45.72), (-25.4, 50.8))
            Line((-25.4, 50.8), (-20.32, 50.8))
        make_face()
    extrude(amount=-F4_T115_DEPTH)

    split(bisect_by=Plane.XZ.offset(25.4), keep=Keep.BOTTOM)


with BuildPart() as f1_16:
    add(f1_15.part)

    # F4_t112: union F4_tool113
    add(f4_tool113.part)

    # F6 (on offset) → F7 (cut)
    with BuildSketch(Plane.XZ.offset(25.4)):
        with BuildLine():
            add(Edge.make_bspline(
                [(-19.9538823217, 40.0411081183), (-24.3532913729, 40.0411081183), (-22.1535868473, 32.4211081183), (-19.9538823217, 24.8011081183), (-17.7541777961, 32.4211081183), (-15.5544732705, 40.0411081183), (-19.9538823217, 40.0411081183)],
                knots=[0, 0, 0, 2.0943951024, 2.0943951024, 4.1887902048, 4.1887902048, 6.2831853072, 6.2831853072, 6.2831853072], degree=2, weights=[1, 0.5, 1, 0.5, 1, 0.5, 1]))
        make_face()
        with BuildLine():
            add(Edge.make_bspline(
                [(19.7207042576, 39.9870246475), (15.3212952063, 39.9870246475), (17.5209997319, 32.3670246475), (19.7207042576, 24.7470246475), (21.9204087832, 32.3670246475), (24.1201133088, 39.9870246475), (19.7207042576, 39.9870246475)],
                knots=[0, 0, 0, 2.0943951024, 2.0943951024, 4.1887902048, 4.1887902048, 6.2831853072, 6.2831853072, 6.2831853072], degree=2, weights=[1, 0.5, 1, 0.5, 1, 0.5, 1]))
        make_face()
    extrude(amount=-F7_DEPTH, mode=Mode.SUBTRACT)

    # F8 (on offset) → F9 (cut)
    with BuildSketch(Plane.XZ.offset(25.4)):
        with BuildLine():
            add(Edge.make_bspline(
                [(-19.8178328574, 25.164861232), (-22.6623498561, 22.5631797606), (0.1459036803, 14.7938469787), (36.8441903107, 30.6531948363), (-15.9304937435, 28.7203394206), (-19.8178328574, 25.164861232)],
                knots=[0, 0, 0, 0, 0.297963223, 0.5928011358, 1, 1, 1, 1], degree=3))
        make_face()
    extrude(amount=-F9_DEPTH, mode=Mode.SUBTRACT)

    # F10 (on Right) → F11 (join, two sides)
    with BuildSketch(Plane.YZ) as f11_sk:
        with Locations((-11.1081842333, 63.6173412204)):
            Circle(F10_R)
        with Locations((7.134210784, 63.4367242455)):
            Circle(F10_R)
        with Locations((27.4023022503, 60.3210888803)):
            Circle(F10_R)
        with Locations((31.947221607, 41.8740585446)):
            Circle(F10_R)
        with Locations((31.6798724234, 24.2290720344)):
            Circle(F10_R)
    extrude(amount=F11_DEPTH)
    extrude(f11_sk.sketch, amount=-F11_DEPTH_BACK)


solid = f1_16.part
